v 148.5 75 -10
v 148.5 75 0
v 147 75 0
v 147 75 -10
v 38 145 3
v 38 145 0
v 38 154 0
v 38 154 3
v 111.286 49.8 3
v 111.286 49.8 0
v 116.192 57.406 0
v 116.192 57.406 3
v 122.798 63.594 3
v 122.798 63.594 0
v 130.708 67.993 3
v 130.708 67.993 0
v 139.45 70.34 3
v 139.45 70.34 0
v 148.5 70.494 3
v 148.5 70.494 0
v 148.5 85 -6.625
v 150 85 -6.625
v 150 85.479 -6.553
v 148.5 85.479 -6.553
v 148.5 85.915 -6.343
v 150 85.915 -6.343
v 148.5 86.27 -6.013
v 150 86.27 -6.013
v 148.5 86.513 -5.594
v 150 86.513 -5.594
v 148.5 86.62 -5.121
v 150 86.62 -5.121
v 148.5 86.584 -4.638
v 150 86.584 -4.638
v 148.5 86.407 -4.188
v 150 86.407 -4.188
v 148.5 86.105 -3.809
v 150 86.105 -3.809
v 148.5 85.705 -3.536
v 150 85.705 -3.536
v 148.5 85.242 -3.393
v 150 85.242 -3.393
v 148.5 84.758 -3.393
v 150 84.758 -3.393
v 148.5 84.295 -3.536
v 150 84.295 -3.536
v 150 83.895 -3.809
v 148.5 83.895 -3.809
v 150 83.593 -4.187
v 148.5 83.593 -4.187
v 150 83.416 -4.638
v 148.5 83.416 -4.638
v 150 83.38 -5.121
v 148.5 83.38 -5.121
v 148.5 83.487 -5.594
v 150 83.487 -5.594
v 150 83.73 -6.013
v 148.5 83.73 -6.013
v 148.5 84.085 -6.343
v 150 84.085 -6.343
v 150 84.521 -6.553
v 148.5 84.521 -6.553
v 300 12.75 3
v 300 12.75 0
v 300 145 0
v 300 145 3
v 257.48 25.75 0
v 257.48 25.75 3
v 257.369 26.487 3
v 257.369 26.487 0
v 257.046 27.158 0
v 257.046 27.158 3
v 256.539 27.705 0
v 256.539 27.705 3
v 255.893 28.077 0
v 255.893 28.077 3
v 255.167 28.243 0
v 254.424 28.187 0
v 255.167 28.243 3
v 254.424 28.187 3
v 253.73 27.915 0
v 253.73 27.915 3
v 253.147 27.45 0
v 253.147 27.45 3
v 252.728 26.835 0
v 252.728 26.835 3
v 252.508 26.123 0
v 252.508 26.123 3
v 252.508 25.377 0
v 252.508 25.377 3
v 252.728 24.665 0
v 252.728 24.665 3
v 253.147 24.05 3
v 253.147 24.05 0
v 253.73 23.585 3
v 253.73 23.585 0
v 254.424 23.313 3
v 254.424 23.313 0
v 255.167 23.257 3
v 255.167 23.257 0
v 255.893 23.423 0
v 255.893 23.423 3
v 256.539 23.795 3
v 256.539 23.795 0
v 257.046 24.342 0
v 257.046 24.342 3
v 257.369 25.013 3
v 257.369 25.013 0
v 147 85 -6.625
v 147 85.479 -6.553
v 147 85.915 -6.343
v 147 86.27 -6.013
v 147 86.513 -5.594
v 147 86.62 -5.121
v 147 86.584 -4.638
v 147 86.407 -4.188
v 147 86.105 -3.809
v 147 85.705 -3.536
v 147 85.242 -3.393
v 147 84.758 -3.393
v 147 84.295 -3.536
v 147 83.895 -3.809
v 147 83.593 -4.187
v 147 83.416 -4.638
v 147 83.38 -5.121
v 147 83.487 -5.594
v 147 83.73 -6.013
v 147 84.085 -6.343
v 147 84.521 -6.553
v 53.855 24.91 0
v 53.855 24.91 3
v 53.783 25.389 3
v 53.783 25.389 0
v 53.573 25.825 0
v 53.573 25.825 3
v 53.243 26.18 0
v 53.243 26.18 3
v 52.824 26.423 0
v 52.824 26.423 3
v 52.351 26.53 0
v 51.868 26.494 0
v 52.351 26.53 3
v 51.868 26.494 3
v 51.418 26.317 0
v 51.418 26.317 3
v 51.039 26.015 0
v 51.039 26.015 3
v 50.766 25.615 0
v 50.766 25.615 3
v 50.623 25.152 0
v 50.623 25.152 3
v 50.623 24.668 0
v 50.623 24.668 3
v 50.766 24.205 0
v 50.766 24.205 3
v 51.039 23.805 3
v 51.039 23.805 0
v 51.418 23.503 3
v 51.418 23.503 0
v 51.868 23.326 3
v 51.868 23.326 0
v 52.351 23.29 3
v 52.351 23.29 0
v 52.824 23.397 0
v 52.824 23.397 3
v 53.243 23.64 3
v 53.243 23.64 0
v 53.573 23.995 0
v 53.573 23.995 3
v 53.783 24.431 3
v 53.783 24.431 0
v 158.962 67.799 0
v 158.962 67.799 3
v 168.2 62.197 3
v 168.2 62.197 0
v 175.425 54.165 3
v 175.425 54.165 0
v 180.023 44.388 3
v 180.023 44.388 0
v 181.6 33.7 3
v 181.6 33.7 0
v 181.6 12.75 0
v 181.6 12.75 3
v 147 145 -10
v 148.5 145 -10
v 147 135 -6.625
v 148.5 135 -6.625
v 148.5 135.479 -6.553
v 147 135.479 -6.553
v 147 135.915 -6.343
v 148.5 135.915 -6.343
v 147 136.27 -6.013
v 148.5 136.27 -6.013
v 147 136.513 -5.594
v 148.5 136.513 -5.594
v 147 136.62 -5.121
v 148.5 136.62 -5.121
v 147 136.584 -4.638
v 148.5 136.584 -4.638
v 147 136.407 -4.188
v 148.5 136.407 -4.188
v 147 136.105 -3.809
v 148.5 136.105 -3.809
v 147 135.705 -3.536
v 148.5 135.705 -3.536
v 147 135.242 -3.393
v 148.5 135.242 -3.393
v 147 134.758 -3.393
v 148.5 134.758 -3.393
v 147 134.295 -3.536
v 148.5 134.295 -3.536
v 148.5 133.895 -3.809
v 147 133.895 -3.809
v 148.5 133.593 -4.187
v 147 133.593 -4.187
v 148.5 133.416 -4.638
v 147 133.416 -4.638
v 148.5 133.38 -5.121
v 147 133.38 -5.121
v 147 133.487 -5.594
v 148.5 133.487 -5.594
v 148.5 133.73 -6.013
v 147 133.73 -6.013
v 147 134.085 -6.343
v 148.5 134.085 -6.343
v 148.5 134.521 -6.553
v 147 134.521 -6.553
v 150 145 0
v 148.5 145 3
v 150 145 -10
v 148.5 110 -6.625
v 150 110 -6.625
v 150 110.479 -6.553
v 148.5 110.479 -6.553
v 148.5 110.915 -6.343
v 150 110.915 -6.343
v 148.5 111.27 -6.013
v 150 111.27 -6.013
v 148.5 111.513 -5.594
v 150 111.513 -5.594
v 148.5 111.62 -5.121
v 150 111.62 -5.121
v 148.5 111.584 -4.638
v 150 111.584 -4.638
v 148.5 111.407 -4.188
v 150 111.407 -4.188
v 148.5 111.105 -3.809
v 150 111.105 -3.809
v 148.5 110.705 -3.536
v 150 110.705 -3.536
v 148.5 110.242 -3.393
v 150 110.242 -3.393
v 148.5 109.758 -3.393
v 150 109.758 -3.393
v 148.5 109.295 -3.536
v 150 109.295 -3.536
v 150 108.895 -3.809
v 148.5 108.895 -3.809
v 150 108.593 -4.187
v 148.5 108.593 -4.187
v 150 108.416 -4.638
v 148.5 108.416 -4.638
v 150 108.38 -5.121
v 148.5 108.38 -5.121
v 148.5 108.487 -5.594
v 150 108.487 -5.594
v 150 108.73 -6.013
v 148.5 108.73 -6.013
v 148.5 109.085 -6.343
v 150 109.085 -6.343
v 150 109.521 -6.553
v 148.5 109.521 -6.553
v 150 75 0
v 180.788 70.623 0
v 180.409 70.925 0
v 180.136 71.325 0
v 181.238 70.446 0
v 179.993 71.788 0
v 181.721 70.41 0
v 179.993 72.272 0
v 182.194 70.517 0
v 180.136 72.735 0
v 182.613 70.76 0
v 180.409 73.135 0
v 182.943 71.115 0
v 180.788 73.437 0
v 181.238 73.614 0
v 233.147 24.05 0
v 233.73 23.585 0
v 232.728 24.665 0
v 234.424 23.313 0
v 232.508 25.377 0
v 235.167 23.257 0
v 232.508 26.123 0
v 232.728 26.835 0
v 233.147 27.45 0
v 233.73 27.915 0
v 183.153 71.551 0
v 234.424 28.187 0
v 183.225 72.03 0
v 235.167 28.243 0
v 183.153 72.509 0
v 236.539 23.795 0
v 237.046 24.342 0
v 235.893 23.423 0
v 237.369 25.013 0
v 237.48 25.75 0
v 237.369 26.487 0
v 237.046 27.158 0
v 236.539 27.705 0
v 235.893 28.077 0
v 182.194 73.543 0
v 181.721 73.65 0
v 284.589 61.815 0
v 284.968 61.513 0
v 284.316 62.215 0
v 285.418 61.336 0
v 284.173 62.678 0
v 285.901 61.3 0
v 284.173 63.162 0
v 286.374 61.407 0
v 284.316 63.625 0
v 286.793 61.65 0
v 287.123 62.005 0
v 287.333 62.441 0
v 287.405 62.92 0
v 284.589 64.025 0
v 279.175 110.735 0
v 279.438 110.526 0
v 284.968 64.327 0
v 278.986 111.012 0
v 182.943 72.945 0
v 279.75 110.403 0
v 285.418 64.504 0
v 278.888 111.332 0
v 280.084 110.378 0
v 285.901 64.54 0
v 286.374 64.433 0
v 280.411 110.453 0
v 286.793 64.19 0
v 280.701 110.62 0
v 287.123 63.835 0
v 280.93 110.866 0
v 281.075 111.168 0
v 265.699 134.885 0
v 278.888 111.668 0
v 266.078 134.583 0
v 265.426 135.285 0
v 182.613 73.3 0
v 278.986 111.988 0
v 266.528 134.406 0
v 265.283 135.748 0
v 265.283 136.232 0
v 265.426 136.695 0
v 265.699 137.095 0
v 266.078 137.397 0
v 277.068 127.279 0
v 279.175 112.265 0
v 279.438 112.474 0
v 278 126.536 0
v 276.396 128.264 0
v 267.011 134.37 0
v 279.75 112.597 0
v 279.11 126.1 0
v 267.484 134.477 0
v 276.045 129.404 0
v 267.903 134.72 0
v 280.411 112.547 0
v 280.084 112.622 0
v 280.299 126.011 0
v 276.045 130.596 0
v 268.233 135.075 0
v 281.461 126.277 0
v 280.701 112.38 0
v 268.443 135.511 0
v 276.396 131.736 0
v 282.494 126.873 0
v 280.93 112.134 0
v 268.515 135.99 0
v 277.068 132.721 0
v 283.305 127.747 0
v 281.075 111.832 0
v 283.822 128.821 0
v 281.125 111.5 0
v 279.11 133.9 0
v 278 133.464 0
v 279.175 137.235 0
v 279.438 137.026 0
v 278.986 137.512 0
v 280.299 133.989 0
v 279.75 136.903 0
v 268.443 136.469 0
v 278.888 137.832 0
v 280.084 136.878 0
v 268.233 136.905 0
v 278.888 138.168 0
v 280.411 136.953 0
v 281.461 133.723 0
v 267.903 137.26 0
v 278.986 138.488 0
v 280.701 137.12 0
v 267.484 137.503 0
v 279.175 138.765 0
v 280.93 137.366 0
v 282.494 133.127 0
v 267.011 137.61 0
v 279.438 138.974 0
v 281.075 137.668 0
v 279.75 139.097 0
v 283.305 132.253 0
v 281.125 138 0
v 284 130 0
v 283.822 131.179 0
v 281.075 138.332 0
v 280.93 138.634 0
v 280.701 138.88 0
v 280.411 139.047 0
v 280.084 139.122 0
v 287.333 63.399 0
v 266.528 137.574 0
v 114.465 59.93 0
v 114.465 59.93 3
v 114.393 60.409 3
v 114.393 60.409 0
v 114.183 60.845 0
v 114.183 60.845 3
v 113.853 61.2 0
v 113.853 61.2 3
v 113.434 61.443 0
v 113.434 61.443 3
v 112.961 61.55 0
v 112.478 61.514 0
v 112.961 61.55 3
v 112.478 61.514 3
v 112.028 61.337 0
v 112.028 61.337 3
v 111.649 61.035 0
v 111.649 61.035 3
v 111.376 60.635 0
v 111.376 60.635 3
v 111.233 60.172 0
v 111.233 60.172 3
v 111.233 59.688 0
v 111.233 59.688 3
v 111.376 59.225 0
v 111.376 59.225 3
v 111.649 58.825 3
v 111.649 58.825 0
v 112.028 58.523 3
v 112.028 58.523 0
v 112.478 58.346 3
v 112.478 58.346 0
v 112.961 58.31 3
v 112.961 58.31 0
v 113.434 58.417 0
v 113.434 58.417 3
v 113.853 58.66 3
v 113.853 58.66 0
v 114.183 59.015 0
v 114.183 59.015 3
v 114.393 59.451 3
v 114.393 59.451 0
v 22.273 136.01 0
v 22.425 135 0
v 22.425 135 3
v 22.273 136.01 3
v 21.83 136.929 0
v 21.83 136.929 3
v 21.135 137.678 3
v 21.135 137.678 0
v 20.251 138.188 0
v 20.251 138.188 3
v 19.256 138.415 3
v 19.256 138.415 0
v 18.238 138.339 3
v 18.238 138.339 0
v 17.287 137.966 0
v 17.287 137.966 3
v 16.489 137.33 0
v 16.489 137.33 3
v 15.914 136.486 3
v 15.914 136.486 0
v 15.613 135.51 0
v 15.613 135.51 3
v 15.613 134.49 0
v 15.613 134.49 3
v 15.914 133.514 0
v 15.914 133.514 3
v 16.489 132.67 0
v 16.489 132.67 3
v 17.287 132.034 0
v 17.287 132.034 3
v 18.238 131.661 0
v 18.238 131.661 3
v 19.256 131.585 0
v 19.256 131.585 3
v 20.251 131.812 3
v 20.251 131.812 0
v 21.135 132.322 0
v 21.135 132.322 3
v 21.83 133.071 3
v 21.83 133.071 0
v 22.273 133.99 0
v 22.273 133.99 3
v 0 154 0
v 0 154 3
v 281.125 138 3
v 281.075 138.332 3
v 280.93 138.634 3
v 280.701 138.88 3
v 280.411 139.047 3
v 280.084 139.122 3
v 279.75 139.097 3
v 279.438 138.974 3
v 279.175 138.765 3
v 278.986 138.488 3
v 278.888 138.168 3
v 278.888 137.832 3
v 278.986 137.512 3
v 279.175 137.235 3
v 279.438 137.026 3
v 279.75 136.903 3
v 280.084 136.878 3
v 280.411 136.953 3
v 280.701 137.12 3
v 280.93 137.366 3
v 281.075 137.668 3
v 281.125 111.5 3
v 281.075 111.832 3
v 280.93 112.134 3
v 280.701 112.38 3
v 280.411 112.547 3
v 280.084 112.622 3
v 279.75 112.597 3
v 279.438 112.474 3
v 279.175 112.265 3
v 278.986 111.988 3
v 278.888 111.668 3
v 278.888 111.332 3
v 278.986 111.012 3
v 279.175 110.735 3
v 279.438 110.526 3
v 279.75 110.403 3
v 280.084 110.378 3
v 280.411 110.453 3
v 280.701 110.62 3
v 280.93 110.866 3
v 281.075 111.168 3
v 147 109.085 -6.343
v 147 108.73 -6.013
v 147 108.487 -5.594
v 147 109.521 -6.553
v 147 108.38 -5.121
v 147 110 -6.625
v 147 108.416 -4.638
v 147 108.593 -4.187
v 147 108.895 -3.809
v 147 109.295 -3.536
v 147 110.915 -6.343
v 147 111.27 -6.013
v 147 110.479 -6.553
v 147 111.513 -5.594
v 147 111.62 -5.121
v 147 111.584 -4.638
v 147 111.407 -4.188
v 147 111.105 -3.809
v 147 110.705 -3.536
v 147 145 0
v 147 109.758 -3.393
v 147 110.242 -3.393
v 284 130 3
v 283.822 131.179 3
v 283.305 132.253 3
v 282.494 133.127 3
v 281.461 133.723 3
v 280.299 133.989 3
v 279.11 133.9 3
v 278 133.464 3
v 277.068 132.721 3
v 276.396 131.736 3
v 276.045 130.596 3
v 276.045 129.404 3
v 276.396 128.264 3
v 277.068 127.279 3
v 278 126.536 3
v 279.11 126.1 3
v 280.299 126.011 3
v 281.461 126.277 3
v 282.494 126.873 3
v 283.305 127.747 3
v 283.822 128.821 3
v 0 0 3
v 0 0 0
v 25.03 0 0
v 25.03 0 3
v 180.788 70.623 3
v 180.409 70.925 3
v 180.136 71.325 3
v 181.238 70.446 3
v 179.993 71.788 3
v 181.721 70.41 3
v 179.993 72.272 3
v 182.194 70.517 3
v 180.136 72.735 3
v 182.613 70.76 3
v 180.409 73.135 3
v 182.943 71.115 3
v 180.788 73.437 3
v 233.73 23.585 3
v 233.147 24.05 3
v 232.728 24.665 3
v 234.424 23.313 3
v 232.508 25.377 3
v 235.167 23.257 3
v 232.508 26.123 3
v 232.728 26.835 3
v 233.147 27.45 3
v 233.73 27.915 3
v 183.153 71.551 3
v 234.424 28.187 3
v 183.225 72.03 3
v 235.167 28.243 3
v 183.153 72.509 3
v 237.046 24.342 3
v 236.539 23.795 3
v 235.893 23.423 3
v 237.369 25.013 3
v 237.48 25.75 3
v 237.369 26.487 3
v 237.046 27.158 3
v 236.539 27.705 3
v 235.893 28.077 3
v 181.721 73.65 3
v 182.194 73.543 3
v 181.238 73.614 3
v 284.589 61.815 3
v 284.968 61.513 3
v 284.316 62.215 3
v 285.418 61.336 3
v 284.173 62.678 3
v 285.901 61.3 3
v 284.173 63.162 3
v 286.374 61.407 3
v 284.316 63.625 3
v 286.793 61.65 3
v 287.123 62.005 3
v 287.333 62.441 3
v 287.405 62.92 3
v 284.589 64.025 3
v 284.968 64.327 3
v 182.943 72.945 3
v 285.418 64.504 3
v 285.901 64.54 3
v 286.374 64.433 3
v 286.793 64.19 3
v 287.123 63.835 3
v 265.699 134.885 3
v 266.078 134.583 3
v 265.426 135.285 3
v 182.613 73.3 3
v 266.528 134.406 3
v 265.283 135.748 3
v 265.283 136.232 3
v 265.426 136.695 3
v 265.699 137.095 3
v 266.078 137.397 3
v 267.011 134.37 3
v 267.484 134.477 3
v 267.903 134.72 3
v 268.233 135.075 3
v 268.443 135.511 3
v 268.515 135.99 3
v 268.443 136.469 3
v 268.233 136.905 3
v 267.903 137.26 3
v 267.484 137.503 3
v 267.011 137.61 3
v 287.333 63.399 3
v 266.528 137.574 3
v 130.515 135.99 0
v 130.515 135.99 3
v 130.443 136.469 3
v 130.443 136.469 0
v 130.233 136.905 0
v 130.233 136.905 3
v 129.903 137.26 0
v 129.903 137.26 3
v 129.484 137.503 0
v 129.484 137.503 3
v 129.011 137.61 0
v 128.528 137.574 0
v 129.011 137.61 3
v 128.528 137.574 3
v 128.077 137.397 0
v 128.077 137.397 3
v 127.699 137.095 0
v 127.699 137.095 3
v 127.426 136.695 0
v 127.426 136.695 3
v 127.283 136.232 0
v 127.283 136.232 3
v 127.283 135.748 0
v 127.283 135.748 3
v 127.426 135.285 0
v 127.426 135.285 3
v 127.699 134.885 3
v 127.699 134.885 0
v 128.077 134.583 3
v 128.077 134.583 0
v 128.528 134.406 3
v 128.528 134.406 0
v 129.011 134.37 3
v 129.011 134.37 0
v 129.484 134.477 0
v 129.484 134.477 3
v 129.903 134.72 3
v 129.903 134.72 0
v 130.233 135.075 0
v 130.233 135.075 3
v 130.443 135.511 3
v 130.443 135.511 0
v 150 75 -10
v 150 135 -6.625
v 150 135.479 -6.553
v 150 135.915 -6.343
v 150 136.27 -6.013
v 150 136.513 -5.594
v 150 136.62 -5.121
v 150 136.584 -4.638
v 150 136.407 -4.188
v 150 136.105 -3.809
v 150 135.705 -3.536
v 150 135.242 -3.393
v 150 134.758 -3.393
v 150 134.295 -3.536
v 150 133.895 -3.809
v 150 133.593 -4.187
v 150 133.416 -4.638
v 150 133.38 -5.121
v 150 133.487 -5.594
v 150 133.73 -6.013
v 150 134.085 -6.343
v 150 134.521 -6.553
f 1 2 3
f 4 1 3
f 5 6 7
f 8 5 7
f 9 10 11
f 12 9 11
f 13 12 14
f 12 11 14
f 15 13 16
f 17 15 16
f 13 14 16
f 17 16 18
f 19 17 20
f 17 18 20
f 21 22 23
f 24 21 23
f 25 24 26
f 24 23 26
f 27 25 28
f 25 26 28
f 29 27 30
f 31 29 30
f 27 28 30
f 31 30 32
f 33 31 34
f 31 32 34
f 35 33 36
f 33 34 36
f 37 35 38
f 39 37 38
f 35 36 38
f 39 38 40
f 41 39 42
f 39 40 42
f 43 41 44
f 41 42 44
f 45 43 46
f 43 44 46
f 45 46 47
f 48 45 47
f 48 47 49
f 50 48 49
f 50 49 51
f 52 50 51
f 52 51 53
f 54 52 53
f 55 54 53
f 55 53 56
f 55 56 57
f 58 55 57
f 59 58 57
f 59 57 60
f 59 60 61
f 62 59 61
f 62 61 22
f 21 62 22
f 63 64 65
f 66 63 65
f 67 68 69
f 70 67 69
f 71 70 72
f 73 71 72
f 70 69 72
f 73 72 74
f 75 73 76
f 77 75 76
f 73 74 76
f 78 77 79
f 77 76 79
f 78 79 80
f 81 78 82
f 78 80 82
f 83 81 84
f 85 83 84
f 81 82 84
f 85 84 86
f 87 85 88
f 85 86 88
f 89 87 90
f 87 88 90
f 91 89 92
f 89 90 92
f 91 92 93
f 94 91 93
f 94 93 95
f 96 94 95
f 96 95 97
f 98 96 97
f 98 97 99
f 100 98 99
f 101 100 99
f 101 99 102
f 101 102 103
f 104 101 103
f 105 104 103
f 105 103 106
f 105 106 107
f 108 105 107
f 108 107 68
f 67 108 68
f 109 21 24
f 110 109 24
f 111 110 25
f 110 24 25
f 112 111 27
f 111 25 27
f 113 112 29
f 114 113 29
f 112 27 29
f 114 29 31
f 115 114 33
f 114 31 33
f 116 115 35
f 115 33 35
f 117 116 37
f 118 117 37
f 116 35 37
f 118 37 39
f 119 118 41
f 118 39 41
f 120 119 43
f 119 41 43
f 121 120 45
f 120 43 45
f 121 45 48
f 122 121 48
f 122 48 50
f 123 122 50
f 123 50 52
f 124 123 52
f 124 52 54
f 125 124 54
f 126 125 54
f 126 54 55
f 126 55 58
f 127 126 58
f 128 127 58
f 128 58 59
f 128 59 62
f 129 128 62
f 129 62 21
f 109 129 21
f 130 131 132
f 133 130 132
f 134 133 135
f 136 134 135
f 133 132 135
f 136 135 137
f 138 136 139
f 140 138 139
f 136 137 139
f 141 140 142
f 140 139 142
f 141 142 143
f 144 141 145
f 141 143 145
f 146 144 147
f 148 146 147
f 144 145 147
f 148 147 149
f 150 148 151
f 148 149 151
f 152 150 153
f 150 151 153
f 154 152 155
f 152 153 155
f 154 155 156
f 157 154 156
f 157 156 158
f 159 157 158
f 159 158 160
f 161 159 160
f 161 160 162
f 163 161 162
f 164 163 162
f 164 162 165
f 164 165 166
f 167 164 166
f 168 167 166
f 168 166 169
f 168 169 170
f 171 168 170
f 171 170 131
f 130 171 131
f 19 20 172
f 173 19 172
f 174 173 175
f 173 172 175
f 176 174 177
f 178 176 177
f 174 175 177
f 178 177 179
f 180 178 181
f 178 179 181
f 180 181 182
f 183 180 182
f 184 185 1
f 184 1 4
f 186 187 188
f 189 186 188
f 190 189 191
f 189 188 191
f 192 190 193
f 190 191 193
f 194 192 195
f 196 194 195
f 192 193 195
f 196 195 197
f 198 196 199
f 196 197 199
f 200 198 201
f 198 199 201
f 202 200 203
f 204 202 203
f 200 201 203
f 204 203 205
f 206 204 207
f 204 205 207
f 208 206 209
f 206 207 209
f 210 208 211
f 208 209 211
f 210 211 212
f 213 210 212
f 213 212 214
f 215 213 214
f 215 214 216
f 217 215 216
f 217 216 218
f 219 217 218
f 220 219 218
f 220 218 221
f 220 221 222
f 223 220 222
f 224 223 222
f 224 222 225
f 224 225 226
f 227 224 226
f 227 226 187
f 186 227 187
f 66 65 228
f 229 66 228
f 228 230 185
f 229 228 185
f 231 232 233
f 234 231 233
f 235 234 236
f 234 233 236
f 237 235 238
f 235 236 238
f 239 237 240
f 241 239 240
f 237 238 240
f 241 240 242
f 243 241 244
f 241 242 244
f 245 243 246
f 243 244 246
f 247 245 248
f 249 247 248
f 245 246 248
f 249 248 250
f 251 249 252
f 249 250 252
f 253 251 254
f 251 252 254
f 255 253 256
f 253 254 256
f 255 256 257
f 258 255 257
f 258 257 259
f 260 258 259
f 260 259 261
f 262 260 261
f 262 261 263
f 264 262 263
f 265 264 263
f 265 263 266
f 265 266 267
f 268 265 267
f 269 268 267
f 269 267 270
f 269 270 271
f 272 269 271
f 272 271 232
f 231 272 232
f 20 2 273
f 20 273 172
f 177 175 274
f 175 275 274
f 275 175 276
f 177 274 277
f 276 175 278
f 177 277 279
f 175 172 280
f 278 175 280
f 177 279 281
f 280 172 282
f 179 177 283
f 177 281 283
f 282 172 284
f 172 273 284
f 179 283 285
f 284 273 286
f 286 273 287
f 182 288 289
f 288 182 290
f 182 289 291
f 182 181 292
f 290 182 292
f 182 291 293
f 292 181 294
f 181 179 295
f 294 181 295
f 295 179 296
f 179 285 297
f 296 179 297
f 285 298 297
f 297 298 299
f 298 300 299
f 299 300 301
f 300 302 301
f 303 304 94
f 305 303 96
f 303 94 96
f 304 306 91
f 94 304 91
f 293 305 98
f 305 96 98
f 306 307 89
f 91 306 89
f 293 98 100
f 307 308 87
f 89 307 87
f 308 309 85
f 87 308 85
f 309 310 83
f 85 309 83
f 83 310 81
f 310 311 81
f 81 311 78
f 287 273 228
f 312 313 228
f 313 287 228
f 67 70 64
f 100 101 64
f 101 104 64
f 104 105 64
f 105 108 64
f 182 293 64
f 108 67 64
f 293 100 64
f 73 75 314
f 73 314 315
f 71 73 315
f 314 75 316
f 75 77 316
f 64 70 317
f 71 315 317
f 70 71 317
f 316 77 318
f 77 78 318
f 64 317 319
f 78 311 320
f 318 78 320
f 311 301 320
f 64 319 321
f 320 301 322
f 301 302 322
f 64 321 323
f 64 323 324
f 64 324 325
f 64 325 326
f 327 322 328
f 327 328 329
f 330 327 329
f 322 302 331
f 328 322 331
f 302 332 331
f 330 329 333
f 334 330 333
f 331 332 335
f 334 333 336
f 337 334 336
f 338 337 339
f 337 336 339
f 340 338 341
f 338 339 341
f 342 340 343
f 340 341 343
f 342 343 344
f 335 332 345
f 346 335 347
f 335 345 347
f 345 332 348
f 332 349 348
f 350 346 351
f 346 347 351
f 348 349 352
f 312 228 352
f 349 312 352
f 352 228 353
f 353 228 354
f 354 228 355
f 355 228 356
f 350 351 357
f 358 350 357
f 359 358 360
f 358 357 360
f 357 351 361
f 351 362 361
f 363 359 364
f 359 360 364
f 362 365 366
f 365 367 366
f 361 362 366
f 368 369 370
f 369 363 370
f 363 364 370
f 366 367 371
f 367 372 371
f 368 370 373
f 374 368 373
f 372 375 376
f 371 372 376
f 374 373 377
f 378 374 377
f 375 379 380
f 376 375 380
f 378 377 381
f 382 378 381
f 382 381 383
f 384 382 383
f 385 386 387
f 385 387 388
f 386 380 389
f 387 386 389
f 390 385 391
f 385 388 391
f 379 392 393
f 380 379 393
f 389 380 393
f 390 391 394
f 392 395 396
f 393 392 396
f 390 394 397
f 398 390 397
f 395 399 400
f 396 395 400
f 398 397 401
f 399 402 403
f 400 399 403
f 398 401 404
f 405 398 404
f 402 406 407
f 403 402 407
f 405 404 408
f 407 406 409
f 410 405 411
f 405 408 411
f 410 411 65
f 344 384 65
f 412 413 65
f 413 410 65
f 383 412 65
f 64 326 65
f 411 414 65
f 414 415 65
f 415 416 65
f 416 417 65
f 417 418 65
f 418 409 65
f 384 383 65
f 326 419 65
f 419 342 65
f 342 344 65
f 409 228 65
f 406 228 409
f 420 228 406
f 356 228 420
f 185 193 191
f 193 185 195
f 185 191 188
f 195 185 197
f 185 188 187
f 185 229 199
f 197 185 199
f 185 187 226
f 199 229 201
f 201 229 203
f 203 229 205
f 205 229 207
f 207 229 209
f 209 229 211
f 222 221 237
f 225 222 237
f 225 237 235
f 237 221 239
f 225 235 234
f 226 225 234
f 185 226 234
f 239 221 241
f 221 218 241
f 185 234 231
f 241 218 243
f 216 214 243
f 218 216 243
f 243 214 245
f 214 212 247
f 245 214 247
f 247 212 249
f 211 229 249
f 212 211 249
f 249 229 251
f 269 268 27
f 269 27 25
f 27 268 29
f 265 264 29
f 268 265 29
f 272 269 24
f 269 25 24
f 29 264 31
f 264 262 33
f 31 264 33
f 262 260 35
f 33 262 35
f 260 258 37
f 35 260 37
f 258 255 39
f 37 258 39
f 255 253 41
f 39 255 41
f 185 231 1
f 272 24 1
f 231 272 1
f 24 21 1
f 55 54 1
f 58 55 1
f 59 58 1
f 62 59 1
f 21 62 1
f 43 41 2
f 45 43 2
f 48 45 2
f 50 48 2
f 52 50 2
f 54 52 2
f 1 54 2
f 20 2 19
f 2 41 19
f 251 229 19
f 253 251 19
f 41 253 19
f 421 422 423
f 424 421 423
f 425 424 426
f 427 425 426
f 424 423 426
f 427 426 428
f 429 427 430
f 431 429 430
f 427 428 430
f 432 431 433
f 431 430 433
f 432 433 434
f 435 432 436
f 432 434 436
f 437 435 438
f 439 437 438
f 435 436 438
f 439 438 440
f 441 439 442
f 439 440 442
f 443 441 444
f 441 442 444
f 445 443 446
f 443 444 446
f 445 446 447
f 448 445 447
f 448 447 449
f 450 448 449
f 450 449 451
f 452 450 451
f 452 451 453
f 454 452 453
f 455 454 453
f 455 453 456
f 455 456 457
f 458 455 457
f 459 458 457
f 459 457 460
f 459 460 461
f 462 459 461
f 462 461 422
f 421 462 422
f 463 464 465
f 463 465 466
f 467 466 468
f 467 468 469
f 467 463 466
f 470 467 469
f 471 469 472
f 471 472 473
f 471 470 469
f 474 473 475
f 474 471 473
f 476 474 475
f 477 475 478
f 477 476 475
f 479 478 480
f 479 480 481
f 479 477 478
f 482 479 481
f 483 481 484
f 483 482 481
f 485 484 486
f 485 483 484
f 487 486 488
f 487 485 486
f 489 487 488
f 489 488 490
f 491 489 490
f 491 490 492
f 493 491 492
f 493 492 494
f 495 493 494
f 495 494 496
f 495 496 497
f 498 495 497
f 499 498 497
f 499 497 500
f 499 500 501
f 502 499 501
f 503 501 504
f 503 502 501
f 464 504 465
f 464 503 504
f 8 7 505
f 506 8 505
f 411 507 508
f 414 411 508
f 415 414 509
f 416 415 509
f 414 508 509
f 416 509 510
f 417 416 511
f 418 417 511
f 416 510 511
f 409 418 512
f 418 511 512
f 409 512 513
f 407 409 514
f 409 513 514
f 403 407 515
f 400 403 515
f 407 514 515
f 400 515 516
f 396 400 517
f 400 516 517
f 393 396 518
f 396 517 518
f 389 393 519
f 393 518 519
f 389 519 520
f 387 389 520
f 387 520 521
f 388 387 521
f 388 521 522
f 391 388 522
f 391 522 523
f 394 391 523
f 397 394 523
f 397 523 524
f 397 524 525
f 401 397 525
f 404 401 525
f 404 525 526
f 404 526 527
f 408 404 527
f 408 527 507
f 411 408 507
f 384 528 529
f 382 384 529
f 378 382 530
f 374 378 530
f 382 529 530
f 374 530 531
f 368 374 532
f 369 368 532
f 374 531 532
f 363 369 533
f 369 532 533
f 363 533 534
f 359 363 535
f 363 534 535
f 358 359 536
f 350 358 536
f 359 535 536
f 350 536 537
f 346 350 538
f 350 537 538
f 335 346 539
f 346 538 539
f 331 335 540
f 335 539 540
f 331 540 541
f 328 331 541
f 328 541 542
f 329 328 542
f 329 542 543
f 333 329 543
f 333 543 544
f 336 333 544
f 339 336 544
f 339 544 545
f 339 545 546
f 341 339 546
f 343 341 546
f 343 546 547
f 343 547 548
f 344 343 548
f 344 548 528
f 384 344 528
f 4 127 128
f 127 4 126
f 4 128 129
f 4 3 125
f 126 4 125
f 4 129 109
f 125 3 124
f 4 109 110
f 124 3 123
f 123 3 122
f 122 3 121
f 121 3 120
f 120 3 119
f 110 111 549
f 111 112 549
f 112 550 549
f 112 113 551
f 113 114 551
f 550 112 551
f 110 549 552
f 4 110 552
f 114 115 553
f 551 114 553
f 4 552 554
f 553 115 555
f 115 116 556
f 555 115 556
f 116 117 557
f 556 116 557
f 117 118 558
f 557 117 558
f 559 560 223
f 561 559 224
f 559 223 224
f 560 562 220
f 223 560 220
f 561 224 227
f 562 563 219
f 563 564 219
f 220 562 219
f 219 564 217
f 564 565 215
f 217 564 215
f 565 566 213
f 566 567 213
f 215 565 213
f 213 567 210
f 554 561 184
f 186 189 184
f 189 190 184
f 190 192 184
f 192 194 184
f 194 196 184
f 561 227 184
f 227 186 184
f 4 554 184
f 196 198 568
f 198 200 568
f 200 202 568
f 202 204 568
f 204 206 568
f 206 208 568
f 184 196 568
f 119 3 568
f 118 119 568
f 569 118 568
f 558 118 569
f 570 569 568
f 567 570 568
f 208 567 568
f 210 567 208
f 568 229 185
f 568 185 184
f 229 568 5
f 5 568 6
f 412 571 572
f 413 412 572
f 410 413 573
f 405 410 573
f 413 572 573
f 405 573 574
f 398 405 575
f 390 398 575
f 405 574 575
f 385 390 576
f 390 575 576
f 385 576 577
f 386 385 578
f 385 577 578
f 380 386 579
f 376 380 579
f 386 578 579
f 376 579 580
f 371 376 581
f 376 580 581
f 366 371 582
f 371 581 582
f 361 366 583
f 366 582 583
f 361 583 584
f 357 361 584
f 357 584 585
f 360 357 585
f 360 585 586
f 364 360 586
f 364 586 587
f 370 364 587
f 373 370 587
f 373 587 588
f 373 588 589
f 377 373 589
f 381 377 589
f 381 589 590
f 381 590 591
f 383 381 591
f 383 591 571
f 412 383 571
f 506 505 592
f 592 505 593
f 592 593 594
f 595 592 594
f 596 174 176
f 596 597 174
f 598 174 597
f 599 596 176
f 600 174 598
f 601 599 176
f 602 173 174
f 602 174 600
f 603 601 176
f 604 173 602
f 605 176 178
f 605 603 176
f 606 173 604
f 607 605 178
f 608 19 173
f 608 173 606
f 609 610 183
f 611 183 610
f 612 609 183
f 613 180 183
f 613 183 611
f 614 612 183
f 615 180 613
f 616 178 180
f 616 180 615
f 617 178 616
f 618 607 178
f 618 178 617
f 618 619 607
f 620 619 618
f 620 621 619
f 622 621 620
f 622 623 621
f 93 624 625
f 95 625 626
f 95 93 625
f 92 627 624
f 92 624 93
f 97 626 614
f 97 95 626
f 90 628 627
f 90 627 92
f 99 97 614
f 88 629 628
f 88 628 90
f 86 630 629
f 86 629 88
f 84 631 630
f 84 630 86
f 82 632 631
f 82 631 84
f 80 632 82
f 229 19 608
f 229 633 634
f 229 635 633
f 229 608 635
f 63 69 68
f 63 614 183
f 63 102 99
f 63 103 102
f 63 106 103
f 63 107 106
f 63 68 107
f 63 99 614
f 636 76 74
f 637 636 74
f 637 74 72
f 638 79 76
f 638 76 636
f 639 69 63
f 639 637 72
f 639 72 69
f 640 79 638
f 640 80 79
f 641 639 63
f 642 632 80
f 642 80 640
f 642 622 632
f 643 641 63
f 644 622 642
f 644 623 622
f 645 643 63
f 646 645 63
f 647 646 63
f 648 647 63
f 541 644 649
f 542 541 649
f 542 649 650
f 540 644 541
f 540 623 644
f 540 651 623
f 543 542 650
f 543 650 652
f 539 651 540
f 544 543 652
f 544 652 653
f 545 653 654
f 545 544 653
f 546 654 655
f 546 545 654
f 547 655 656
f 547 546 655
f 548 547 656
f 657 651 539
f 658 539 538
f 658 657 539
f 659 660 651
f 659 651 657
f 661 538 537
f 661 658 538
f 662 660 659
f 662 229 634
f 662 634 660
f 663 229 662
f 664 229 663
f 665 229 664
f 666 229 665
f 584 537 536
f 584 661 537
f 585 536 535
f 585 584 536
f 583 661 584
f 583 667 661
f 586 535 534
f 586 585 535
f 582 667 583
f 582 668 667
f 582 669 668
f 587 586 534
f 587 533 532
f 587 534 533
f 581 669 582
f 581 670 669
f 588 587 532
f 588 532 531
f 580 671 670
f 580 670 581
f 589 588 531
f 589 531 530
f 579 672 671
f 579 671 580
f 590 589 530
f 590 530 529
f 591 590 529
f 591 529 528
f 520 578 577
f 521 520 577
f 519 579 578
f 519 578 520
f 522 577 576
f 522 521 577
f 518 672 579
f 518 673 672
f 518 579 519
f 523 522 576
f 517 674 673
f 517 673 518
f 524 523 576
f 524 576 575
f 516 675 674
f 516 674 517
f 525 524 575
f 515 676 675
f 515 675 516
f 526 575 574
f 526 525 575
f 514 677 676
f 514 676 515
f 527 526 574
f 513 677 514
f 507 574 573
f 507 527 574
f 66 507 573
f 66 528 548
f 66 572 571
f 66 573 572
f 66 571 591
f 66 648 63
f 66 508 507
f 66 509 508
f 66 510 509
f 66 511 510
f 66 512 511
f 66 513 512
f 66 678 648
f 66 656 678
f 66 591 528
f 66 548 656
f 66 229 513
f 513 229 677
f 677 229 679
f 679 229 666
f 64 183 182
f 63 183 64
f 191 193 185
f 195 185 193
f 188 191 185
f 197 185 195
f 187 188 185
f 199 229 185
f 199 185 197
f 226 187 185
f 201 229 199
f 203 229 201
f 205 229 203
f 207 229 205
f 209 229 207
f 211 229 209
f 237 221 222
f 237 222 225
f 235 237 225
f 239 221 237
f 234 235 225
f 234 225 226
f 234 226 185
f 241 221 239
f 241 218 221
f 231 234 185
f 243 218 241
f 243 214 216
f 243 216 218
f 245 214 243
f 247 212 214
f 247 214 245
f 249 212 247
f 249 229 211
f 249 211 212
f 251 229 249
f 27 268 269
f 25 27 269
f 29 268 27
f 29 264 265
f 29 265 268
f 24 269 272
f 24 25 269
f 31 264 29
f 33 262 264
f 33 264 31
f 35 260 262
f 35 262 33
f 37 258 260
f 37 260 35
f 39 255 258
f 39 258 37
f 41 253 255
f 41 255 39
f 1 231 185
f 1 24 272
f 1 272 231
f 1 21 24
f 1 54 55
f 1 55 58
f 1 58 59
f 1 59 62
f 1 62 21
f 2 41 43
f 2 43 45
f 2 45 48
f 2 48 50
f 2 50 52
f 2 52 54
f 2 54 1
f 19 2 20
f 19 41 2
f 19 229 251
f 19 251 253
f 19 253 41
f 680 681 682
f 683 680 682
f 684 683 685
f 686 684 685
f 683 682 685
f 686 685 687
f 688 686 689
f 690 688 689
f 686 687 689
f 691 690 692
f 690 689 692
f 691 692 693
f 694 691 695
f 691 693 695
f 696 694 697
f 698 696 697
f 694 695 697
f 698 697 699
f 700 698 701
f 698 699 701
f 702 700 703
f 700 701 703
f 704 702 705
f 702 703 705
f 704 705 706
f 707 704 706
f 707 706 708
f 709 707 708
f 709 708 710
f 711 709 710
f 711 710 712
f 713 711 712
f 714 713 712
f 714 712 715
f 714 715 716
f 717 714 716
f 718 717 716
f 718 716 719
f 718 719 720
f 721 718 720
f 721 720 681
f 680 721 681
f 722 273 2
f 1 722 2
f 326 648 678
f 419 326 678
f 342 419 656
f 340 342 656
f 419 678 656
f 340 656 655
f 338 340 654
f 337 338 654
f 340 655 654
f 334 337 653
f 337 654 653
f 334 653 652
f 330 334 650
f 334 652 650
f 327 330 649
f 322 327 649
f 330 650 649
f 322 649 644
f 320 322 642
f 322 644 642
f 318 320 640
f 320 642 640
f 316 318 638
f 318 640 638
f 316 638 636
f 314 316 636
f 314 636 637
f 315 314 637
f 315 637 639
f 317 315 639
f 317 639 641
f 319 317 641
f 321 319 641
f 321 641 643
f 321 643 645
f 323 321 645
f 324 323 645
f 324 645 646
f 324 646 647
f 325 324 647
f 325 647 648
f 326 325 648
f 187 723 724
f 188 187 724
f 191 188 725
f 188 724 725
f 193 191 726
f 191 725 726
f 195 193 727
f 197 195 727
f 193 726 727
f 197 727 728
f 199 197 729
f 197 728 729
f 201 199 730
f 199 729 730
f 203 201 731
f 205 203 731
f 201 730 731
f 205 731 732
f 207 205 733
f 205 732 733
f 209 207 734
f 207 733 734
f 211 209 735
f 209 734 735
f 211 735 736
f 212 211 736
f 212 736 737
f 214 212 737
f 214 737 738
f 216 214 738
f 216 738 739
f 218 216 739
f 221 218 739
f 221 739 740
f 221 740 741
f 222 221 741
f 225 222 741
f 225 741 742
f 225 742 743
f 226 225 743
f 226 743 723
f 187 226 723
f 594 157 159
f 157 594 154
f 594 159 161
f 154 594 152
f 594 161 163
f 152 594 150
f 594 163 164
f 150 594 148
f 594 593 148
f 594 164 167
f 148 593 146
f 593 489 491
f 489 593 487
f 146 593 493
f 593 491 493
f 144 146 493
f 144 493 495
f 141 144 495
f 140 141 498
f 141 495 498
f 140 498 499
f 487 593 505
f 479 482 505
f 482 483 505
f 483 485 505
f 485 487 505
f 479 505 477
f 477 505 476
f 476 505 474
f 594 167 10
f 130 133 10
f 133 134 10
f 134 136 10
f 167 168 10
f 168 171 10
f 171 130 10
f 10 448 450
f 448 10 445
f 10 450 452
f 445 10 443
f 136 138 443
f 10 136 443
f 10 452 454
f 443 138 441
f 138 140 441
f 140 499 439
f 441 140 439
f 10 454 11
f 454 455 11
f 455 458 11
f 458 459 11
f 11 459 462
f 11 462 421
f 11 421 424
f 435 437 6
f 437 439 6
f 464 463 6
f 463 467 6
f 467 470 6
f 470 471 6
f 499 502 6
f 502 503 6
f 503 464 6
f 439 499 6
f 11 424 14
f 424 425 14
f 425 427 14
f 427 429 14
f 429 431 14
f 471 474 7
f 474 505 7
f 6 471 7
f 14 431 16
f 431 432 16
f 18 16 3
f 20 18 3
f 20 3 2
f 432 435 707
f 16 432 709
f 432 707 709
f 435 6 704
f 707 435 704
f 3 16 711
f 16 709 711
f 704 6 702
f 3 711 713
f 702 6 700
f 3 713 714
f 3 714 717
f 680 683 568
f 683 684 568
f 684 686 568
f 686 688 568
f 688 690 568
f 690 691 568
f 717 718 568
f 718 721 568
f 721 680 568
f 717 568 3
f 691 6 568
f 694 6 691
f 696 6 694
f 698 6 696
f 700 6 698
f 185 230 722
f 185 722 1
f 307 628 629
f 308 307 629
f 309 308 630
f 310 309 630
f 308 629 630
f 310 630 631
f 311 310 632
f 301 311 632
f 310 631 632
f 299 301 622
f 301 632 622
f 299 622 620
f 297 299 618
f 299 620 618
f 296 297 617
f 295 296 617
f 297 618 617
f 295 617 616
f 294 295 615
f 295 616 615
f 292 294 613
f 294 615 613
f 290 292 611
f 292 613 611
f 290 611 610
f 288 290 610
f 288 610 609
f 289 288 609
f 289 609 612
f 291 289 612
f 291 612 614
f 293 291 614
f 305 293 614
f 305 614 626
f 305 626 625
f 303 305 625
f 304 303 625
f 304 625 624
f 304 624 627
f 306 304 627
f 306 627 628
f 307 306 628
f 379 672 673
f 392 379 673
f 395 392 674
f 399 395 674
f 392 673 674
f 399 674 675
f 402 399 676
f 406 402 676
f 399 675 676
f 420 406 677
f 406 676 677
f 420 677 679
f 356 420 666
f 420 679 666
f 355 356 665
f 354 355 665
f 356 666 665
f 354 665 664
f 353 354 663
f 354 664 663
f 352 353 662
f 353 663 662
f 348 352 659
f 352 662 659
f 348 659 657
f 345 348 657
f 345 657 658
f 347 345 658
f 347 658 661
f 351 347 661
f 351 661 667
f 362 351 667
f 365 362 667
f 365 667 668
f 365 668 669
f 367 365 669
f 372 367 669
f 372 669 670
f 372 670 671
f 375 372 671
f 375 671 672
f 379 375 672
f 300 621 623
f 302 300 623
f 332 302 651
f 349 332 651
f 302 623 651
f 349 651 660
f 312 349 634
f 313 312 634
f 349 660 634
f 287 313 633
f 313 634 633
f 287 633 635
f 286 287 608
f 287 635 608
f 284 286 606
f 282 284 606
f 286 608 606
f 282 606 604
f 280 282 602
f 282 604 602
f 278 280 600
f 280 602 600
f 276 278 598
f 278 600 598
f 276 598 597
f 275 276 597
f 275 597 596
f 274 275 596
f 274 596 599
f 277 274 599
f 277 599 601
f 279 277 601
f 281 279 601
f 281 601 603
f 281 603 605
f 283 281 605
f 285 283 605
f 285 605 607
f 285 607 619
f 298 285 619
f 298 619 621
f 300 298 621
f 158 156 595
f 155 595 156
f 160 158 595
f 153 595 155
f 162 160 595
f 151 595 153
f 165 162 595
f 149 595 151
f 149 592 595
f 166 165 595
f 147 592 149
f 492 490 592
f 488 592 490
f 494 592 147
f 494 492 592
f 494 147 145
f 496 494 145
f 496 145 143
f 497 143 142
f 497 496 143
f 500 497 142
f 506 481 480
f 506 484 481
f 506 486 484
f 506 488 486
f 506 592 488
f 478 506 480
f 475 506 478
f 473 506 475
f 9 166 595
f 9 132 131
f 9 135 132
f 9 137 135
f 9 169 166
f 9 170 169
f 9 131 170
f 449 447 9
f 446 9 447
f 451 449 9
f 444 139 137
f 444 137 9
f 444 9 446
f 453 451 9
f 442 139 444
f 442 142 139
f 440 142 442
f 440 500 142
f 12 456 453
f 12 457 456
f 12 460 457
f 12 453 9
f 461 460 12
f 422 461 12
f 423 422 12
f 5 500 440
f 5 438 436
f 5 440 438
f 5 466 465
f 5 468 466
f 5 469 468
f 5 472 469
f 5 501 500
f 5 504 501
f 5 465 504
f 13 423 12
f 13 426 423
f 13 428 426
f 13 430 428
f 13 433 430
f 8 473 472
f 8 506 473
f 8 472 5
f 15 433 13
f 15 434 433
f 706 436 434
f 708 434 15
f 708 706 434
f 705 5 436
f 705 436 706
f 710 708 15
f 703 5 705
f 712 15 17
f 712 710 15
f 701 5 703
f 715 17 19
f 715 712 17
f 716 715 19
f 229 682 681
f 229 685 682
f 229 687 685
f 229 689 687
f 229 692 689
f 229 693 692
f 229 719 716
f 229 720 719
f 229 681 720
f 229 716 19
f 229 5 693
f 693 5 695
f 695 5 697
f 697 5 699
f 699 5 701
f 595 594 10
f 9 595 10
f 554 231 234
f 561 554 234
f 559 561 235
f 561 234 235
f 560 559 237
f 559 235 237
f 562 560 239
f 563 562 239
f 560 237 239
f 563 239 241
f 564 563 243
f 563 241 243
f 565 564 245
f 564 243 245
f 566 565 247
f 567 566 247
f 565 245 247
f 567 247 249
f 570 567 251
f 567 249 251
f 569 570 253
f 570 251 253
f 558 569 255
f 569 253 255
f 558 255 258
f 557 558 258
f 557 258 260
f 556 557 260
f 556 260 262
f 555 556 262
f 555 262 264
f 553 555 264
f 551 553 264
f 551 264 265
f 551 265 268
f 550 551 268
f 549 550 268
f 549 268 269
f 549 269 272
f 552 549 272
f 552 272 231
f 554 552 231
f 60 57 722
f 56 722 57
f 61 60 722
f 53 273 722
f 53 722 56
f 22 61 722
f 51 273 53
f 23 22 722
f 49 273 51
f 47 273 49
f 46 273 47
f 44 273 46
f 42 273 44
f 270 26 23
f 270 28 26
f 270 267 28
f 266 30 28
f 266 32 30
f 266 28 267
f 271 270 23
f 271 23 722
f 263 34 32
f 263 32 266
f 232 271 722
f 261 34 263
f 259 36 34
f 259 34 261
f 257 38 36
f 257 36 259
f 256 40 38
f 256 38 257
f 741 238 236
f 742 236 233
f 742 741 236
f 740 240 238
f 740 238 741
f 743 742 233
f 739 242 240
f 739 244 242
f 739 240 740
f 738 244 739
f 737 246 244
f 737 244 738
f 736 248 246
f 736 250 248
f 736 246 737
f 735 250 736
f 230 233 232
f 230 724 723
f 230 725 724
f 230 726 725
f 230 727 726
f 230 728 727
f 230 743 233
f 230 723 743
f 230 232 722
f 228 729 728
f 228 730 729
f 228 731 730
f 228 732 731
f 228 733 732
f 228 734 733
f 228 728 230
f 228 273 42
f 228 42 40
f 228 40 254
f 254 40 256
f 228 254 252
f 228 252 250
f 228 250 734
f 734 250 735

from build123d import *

# Parameters (mm, degrees)
SKETCH2_R              = 3.425
BOSS_EXTRUDE2_DEPTH    = 3
SKETCH3_W              = 118.4
SKETCH3_H              = 12.75
CUT_EXTRUDE1_DEPTH     = 338.231374578
SKETCH5_R              = 2.5
SKETCH5_R_2            = 4
SKETCH5_R_3            = 1.125
SKETCH5_R_4            = 1.625
CUT_EXTRUDE2_DEPTH     = 338.231374578
SKETCH12_W             = 3
SKETCH12_H             = 70
BOSS_EXTRUDE6_DEPTH    = 10
CUT_EXTRUDE5_REACH     = 217.212
SKETCH15_R             = 1.625
SPLIT4_SURFACE_1_BACK  = 338.469
SPLIT4_SURFACE_1_DEPTH = 676.938
SPLIT4_SURFACE_2_BACK  = 338.469
SPLIT4_SURFACE_2_DEPTH = 676.938


with BuildPart() as part:
    # Sketch2 → Boss-Extrude2 (new body)
    with BuildSketch(Plane.XY):
        with BuildLine():
            Line((25.03035901, 0), (111.286489227, 49.8))
            ThreePointArc((111.286489227, 49.8), (152.858332199, 69.766604349), (181.6, 33.7))
            Line((181.6, 33.7), (181.6, 0))
            Line((181.6, 0), (300, 0))
            Line((300, 0), (300, 145))
            Line((300, 145), (38, 145))
            Line((38, 145), (38, 154))
            Line((38, 154), (19, 154))
            Line((19, 154), (0, 154))
            Line((0, 154), (0, 0))
            Line((0, 0), (25.03035901, 0))
        make_face()
        with Locations((19, 135)):
            Circle(SKETCH2_R, mode=Mode.SUBTRACT)
    extrude(amount=BOSS_EXTRUDE2_DEPTH)

    # Sketch3 → Cut-Extrude1 (cut, through all)
    with BuildSketch(Plane.XY.offset(3)):
        with Locations((240.8, 6.375)):
            Rectangle(SKETCH3_W, SKETCH3_H)
    extrude(amount=-CUT_EXTRUDE1_DEPTH, mode=Mode.SUBTRACT)

    # Sketch5 → Cut-Extrude2 (cut, through all)
    with BuildSketch(Plane.XY.offset(3)):
        with Locations((254.98, 25.75)):
            Circle(SKETCH5_R)
        with Locations((234.98, 25.75)):
            Circle(SKETCH5_R)
        with Locations((280, 130)):
            Circle(SKETCH5_R_2)
        with Locations((280, 138)):
            Circle(SKETCH5_R_3)
        with Locations((280, 111.5)):
            Circle(SKETCH5_R_3)
        with Locations((181.6, 72.03)):
            Circle(SKETCH5_R_4)
        with Locations((285.78, 62.92)):
            Circle(SKETCH5_R_4)
        with Locations((52.23, 24.91)):
            Circle(SKETCH5_R_4)
        with Locations((112.84, 59.93)):
            Circle(SKETCH5_R_4)
        with Locations((266.89, 135.99)):
            Circle(SKETCH5_R_4)
        with Locations((128.89, 135.99)):
            Circle(SKETCH5_R_4)
    extrude(amount=-CUT_EXTRUDE2_DEPTH, mode=Mode.SUBTRACT)

    # Sketch12 → Boss-Extrude6 (add)
    with BuildSketch(Plane(origin=(0, 0, 0), x_dir=(-1, 0, 0), z_dir=(0, 0, -1))):
        with Locations((-148.5, 110)):
            Rectangle(SKETCH12_W, SKETCH12_H)
    extrude(amount=BOSS_EXTRUDE6_DEPTH)

    # Sketch15 → Cut-Extrude5 (cut, up to next)
    with BuildSketch(Plane(origin=(150, 0, 0), x_dir=(0, 0, -1), z_dir=(1, 0, 0)), mode=Mode.PRIVATE) as cut_extrude5_sk1:
        with Locations((5, 135)):
            Circle(SKETCH15_R)
    cut_extrude5_tool1 = extrude(cut_extrude5_sk1.sketch, amount=-CUT_EXTRUDE5_REACH, mode=Mode.PRIVATE) & part.part
    # Sketch15 → Cut-Extrude5 (cut, up to next)
    with BuildSketch(Plane(origin=(150, 0, 0), x_dir=(0, 0, -1), z_dir=(1, 0, 0)), mode=Mode.PRIVATE) as cut_extrude5_sk2:
        with Locations((5, 110)):
            Circle(SKETCH15_R)
    cut_extrude5_tool2 = extrude(cut_extrude5_sk2.sketch, amount=-CUT_EXTRUDE5_REACH, mode=Mode.PRIVATE) & part.part
    # Sketch15 → Cut-Extrude5 (cut, up to next)
    with BuildSketch(Plane(origin=(150, 0, 0), x_dir=(0, 0, -1), z_dir=(1, 0, 0)), mode=Mode.PRIVATE) as cut_extrude5_sk3:
        with Locations((5, 85)):
            Circle(SKETCH15_R)
    cut_extrude5_tool3 = extrude(cut_extrude5_sk3.sketch, amount=-CUT_EXTRUDE5_REACH, mode=Mode.PRIVATE) & part.part
    add(cut_extrude5_tool1.solids().sort_by_distance((150, 135, -5))[0], mode=Mode.SUBTRACT)
    add(cut_extrude5_tool2.solids().sort_by_distance((150, 110, -5))[0], mode=Mode.SUBTRACT)
    add(cut_extrude5_tool3.solids().sort_by_distance((150, 85, -5))[0], mode=Mode.SUBTRACT)


with BuildPart() as body_2:
    # Split4: the piece behind the surface
    add(part.part)
    # Split4 surface: a surface, the sketch's curves swept straight by 676.938 mm
    with BuildLine(Plane(origin=(0, 0, -10), x_dir=(-1, 0, 0), z_dir=(0, 0, -1)).offset(-SPLIT4_SURFACE_1_BACK), mode=Mode.PRIVATE) as split4_surface_1_path:
        Line((-148.5, 145), (-148.5, 70.493885362))
    split4_surface_1 = Shell.extrude(split4_surface_1_path.wire(), (0 * SPLIT4_SURFACE_1_DEPTH, 0 * SPLIT4_SURFACE_1_DEPTH, -1 * SPLIT4_SURFACE_1_DEPTH))
    split(bisect_by=split4_surface_1, keep=Keep.BOTTOM)


with BuildPart() as part_1:
    add(part.part)

    # Split4: split by a surface, the side it looks to stays
    # Split4 surface: a surface, the sketch's curves swept straight by 676.938 mm
    with BuildLine(Plane(origin=(0, 0, -10), x_dir=(-1, 0, 0), z_dir=(0, 0, -1)).offset(-SPLIT4_SURFACE_2_BACK), mode=Mode.PRIVATE) as split4_surface_2_path:
        Line((-148.5, 145), (-148.5, 70.493885362))
    split4_surface_2 = Shell.extrude(split4_surface_2_path.wire(), (0 * SPLIT4_SURFACE_2_DEPTH, 0 * SPLIT4_SURFACE_2_DEPTH, -1 * SPLIT4_SURFACE_2_DEPTH))
    split(bisect_by=split4_surface_2, keep=Keep.TOP)


solid = Compound([body_2.part, part_1.part])
